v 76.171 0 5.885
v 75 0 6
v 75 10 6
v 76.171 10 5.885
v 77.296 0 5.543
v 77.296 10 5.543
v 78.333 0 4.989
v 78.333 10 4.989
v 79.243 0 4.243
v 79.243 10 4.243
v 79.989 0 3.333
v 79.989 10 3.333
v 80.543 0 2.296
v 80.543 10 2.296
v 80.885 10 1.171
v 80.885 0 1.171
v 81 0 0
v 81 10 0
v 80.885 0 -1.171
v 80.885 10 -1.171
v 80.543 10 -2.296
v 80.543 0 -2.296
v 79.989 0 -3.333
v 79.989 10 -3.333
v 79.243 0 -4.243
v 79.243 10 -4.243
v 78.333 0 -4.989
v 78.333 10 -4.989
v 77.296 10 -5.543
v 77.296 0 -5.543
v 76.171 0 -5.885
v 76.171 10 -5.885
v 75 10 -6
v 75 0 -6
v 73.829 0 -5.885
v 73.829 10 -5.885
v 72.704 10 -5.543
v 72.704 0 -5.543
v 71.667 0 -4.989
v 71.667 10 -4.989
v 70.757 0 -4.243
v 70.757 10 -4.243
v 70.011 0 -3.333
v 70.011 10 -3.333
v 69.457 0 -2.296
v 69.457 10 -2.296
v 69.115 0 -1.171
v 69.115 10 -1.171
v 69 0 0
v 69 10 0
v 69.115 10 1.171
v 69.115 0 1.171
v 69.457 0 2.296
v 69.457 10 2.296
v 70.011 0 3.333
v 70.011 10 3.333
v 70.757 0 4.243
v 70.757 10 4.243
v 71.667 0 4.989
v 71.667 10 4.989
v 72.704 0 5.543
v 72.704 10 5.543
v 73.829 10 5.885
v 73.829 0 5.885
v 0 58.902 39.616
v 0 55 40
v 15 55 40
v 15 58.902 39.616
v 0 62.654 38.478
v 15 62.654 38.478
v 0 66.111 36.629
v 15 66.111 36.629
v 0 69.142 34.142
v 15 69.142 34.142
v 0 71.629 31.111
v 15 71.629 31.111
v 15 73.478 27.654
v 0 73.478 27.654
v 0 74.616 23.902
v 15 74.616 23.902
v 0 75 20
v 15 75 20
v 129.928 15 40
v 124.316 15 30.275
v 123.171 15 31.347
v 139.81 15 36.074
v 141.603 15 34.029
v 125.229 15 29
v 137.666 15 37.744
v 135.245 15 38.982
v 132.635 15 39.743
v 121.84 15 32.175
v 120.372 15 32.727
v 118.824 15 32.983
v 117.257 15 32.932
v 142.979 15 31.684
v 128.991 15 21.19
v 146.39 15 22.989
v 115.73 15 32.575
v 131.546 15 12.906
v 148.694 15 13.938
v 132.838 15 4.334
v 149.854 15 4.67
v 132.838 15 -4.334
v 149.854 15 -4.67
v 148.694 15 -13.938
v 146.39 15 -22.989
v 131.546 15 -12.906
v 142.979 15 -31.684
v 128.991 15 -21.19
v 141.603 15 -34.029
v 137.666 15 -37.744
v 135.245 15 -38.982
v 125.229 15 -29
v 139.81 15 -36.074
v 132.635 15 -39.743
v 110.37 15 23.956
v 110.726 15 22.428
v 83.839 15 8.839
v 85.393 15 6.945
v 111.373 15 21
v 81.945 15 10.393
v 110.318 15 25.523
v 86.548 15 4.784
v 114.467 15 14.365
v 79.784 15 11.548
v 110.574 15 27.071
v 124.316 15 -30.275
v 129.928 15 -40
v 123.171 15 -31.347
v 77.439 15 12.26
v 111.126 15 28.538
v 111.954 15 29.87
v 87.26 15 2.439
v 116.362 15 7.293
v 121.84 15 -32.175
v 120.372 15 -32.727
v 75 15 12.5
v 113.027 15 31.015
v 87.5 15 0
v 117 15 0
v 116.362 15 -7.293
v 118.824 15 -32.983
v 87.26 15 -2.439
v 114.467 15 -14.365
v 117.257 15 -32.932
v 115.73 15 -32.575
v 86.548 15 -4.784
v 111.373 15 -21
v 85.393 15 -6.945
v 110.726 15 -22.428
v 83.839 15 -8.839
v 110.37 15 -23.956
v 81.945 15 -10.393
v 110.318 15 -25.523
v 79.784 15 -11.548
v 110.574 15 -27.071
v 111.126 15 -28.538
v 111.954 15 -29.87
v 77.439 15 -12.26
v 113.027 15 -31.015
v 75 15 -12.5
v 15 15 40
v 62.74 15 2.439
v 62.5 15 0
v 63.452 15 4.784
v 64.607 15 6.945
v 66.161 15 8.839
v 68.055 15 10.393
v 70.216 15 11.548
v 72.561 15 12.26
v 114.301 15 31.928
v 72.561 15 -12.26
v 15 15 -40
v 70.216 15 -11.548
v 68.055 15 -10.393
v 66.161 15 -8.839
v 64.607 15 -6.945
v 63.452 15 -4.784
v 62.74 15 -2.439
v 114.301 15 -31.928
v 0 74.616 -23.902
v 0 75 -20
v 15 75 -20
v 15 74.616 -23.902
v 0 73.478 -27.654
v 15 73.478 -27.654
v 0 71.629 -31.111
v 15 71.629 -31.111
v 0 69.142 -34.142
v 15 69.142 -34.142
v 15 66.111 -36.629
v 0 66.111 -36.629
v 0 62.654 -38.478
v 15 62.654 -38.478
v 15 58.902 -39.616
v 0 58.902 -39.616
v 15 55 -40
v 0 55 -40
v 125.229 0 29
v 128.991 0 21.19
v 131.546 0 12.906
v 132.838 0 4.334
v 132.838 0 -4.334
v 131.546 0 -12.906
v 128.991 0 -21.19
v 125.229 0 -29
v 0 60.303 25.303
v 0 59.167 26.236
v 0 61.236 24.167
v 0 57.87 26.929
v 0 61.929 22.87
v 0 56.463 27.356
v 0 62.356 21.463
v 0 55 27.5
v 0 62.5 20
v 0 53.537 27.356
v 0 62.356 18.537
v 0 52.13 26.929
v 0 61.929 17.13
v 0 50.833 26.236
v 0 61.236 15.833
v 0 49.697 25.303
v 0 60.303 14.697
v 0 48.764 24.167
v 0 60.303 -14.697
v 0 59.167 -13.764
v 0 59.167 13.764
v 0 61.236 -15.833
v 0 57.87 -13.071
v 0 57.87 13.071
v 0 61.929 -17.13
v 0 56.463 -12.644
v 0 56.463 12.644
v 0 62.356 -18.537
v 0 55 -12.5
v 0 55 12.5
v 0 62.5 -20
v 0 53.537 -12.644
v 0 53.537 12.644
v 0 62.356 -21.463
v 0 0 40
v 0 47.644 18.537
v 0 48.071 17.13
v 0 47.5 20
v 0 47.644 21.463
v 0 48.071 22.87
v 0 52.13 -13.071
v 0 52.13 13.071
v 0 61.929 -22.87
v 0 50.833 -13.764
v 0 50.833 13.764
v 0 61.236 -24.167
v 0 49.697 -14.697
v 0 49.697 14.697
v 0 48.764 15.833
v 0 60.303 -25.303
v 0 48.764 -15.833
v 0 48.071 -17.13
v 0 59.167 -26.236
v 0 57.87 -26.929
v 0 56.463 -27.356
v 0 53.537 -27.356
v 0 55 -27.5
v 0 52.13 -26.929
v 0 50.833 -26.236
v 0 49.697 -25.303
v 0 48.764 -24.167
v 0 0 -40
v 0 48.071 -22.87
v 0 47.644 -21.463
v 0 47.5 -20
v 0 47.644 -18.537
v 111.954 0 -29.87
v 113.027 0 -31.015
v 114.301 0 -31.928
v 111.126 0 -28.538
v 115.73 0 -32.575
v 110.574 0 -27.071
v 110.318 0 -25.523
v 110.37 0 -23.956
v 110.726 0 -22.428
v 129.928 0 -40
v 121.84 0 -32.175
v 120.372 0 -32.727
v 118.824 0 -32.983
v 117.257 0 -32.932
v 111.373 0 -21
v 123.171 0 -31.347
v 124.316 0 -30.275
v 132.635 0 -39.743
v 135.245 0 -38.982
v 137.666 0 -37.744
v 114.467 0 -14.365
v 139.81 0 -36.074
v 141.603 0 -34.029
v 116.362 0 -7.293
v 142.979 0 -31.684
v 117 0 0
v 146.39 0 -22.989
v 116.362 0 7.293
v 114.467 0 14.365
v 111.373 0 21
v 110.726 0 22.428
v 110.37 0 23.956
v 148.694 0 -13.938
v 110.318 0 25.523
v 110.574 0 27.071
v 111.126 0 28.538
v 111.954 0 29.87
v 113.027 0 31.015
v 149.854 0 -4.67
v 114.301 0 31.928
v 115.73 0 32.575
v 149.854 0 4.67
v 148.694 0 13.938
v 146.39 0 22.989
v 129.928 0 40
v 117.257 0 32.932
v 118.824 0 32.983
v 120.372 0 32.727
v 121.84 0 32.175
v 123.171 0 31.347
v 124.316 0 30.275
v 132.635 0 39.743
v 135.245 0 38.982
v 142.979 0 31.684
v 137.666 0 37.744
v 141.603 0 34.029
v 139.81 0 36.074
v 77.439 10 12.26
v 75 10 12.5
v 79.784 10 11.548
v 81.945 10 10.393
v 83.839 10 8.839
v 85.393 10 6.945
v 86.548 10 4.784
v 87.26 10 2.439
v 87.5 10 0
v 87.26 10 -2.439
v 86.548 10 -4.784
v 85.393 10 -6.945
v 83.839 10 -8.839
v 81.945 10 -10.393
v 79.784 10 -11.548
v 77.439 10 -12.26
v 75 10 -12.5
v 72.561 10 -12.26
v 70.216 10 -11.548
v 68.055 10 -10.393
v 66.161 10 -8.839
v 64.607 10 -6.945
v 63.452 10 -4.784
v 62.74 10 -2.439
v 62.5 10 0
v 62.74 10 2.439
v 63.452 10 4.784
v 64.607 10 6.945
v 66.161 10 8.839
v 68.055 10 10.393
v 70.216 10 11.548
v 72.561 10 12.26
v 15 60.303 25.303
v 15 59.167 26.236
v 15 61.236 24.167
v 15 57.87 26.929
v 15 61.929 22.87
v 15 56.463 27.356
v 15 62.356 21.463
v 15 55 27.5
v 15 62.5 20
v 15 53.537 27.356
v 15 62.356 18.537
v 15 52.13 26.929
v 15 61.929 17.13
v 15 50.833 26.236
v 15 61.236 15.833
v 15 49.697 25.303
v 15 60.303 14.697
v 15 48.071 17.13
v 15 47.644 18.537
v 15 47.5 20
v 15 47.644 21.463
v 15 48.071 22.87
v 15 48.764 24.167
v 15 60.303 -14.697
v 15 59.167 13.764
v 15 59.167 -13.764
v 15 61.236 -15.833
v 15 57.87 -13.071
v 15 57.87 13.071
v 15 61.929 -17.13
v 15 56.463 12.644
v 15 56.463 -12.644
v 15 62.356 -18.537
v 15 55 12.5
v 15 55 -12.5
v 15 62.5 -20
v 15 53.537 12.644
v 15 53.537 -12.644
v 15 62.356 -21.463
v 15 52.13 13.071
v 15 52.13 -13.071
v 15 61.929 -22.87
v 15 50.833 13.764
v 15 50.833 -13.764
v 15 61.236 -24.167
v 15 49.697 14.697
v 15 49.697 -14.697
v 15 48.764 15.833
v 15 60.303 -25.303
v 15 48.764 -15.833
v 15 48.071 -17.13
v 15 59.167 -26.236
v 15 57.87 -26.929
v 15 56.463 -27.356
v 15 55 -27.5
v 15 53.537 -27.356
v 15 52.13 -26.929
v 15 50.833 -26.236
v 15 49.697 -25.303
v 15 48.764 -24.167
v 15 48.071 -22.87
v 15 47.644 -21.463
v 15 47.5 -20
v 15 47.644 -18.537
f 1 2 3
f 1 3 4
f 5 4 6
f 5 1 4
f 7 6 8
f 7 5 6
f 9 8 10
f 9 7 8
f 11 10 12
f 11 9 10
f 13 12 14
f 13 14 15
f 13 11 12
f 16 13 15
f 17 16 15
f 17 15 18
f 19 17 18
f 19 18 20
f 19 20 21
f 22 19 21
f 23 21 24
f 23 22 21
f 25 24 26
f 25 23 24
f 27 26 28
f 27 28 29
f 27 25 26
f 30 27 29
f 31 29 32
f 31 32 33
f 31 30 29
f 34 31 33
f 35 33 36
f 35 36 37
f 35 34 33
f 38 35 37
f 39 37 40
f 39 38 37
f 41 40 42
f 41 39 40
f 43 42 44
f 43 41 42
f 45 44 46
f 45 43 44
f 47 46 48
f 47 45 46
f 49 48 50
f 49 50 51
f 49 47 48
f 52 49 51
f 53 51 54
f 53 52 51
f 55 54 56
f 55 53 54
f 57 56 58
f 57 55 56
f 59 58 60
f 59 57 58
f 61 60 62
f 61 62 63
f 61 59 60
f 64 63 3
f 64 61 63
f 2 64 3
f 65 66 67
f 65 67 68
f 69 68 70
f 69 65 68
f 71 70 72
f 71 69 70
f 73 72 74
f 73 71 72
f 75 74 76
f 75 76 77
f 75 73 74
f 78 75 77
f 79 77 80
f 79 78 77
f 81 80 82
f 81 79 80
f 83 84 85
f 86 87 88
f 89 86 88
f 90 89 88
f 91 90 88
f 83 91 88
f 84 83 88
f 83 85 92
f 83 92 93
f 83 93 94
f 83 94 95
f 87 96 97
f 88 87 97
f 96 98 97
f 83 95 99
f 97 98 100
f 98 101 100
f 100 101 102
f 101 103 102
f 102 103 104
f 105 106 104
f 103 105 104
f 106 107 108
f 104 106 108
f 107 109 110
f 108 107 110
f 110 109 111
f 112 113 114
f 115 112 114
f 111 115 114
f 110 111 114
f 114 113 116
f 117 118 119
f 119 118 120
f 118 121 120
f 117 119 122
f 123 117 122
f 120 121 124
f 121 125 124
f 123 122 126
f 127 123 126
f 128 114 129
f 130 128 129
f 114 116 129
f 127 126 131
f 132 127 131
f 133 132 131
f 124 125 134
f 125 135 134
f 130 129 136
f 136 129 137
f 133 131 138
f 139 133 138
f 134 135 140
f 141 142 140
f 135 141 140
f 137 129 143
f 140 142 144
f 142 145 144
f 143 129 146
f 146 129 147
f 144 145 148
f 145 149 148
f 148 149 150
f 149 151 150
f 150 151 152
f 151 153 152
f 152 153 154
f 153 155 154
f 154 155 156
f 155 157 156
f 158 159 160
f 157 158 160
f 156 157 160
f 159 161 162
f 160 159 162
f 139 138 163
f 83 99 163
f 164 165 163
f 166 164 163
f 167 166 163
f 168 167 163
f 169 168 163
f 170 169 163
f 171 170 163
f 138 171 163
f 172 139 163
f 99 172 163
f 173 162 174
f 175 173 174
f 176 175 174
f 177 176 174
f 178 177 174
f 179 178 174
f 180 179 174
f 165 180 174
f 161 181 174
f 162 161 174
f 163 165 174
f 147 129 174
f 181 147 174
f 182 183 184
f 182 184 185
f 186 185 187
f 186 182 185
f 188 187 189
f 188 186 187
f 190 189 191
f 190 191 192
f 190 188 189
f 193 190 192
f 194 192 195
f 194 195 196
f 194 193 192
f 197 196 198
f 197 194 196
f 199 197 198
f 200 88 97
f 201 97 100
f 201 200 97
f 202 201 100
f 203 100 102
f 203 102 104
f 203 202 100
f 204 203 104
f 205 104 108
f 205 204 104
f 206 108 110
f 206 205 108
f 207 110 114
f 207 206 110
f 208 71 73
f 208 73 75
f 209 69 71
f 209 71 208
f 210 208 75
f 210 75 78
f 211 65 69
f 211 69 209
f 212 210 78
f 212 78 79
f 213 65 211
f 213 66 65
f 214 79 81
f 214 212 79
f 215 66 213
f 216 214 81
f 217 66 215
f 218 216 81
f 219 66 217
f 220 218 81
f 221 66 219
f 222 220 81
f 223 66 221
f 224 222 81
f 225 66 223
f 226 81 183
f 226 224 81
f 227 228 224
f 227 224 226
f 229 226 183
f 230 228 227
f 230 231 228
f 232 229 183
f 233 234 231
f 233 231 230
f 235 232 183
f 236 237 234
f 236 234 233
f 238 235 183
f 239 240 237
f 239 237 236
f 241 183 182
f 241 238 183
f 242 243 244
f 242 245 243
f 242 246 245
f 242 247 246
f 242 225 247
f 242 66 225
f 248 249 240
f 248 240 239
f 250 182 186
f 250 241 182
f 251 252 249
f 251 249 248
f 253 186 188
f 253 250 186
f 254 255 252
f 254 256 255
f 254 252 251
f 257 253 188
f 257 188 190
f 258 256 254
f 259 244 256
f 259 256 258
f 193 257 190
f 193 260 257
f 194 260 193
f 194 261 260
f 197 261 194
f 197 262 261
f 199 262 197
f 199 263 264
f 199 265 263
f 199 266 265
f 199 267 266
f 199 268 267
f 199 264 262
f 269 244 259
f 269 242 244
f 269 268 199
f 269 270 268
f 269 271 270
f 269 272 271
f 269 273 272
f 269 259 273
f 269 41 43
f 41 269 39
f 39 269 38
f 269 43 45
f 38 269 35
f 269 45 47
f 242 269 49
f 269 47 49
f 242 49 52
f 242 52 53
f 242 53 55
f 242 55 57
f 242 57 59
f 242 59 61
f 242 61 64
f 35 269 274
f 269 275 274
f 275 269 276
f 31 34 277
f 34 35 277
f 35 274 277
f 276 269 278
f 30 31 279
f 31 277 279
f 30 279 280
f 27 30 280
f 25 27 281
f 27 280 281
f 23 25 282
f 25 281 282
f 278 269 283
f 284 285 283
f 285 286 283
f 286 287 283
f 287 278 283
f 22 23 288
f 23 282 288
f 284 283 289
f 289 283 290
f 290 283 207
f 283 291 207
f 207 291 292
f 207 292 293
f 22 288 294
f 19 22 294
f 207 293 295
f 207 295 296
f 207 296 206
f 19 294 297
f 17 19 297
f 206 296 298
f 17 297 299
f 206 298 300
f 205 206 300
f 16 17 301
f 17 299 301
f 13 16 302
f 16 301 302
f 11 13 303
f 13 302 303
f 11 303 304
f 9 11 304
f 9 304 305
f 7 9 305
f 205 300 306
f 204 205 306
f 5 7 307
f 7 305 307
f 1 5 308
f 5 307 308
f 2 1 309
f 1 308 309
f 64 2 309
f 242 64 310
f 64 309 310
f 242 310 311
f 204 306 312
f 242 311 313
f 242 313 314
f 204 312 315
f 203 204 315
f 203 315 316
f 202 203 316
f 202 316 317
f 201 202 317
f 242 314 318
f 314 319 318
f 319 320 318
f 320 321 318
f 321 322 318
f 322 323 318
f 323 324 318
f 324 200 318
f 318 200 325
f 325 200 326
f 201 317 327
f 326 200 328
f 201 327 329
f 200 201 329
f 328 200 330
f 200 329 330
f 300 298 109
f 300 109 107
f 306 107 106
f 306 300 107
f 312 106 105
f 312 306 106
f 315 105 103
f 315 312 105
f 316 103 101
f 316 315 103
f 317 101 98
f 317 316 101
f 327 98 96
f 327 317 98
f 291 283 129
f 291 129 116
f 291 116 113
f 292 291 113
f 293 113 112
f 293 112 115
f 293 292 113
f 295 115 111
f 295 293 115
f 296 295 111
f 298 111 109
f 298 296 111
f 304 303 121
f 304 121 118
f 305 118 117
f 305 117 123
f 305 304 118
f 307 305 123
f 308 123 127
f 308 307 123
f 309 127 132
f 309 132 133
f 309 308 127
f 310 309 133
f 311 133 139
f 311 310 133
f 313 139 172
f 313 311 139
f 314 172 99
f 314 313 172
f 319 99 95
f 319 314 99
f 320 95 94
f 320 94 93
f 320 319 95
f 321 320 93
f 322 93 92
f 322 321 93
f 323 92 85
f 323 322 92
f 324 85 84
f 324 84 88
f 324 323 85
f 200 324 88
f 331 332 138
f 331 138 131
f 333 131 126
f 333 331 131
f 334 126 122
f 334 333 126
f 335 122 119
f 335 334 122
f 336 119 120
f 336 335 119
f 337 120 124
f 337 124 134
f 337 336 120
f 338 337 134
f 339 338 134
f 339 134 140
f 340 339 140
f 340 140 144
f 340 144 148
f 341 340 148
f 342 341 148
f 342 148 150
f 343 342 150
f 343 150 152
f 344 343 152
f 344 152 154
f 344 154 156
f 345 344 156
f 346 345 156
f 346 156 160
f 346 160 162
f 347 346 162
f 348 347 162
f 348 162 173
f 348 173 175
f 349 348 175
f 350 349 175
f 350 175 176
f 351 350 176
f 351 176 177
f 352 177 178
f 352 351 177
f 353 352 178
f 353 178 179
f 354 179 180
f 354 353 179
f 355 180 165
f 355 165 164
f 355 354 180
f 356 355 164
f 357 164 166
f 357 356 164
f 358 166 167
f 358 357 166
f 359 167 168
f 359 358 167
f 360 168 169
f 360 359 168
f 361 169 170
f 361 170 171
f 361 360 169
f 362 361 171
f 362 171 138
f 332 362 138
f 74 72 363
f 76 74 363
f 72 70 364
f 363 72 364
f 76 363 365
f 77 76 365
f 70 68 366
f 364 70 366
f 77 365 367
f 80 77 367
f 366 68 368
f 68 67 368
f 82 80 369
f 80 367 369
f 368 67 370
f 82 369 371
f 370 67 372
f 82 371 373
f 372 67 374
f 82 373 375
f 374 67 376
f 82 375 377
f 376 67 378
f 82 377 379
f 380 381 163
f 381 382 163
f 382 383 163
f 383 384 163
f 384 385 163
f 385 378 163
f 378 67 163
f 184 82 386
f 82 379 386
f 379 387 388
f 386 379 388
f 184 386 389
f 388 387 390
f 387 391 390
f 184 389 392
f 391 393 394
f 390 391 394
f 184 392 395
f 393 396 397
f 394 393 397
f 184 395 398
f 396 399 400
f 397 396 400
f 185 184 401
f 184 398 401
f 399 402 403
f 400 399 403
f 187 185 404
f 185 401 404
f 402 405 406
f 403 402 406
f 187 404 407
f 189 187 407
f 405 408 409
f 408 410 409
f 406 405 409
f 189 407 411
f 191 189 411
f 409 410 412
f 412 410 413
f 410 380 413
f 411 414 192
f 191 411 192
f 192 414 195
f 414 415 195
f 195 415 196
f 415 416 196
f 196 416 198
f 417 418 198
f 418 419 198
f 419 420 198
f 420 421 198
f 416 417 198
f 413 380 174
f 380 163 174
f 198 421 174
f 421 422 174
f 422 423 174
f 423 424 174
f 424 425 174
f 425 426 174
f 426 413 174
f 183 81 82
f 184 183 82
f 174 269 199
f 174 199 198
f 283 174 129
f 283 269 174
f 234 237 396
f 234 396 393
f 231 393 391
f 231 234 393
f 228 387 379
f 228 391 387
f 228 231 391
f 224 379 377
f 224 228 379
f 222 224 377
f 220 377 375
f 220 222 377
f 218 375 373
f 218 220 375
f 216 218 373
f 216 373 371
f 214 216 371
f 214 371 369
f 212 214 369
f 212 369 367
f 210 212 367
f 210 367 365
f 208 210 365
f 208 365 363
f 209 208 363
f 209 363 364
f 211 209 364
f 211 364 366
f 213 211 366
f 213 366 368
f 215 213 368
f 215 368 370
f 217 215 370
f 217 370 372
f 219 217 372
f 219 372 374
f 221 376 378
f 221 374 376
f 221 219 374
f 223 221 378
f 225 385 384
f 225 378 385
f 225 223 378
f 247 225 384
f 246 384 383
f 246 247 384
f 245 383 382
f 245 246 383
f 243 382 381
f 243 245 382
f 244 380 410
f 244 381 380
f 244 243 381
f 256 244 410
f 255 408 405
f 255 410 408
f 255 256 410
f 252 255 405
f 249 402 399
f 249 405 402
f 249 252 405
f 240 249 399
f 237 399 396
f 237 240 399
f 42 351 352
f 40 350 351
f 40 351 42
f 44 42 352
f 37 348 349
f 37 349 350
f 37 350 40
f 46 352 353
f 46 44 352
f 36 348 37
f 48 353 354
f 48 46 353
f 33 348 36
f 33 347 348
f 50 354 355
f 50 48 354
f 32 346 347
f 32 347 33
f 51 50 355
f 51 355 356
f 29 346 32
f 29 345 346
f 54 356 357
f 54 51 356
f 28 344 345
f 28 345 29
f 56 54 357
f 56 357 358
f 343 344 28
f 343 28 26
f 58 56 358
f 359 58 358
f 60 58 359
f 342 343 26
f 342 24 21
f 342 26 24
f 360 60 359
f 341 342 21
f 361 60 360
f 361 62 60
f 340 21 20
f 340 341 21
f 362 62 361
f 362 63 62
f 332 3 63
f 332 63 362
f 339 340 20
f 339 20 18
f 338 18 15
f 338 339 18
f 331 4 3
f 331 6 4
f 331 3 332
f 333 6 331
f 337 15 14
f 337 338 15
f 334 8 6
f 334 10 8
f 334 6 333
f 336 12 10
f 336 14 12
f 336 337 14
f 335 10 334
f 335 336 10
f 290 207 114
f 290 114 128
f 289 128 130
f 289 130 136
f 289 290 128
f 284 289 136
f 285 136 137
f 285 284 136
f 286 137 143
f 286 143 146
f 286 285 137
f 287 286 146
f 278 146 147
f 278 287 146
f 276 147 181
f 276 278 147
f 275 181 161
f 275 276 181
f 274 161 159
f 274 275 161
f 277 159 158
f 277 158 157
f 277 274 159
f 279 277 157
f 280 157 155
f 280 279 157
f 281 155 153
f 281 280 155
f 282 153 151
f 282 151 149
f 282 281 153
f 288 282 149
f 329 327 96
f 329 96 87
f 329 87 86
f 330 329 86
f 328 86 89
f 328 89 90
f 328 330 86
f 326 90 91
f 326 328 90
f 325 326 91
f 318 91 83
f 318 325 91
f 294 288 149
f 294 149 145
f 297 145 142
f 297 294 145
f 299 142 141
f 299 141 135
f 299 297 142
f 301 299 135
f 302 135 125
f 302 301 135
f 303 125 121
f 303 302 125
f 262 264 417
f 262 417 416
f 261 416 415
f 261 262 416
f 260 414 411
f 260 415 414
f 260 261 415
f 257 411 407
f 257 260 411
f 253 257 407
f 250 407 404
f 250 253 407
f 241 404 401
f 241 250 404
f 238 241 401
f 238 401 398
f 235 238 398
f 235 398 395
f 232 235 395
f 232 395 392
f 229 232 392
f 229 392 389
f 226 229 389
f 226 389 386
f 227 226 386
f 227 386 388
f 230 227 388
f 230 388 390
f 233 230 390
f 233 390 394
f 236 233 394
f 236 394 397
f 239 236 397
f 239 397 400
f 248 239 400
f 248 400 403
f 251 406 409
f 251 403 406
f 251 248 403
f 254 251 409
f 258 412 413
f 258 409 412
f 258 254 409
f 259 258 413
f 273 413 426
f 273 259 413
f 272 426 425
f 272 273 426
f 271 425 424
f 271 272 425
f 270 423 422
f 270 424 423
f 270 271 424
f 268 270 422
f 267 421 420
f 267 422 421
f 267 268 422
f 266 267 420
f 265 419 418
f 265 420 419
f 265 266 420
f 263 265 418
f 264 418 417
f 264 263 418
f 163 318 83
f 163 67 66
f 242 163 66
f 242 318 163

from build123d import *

# Parameters (mm, degrees)
SKETCH1_W               = 15
SKETCH1_H               = 80
BOSS_EXTRUDE1_DEPTH     = 75
SKETCH1_3_R             = 12.5
BOSS_EXTRUDE2_DEPTH     = 15
SKETCH1_4_R             = 12.5
SKETCH1_4_R_2           = 6
BOSS_EXTRUDE3_DEPTH     = 10
CUT_EXTRUDE1_DEPTH      = 160.530561335
CUT_EXTRUDE1_DEPTH_BACK = 160.530561335
SKETCH2_R               = 7.5


with BuildPart() as part:
    # Sketch1 → Boss-Extrude1 (new body)
    with BuildSketch(Plane(origin=(0, 0, 0), x_dir=(1, 0, 0), z_dir=(0, 1, 0))):
        with Locations((7.5, 0)):
            Rectangle(SKETCH1_W, SKETCH1_H)
    extrude(amount=BOSS_EXTRUDE1_DEPTH)

    # Sketch1<3> → Boss-Extrude2 (add)
    with BuildSketch(Plane(origin=(0, 0, 0), x_dir=(1, 0, 0), z_dir=(0, 1, 0))):
        with BuildLine():
            Line((129.928343994, 40), (15, 40))
            Line((15, 40), (15, -40))
            Line((15, -40), (129.928343994, -40))
            ThreePointArc((129.928343994, -40), (137.665581407, -37.744432147), (142.97865308, -31.684424019))
            ThreePointArc((142.97865308, -31.684424019), (150, 0), (142.97865308, 31.684424019))
            ThreePointArc((142.97865308, 31.684424019), (137.665581407, 37.744432147), (129.928343994, 40))
        make_face()
        with Locations((75, 0)):
            Circle(SKETCH1_3_R, mode=Mode.SUBTRACT)
        with BuildLine():
            ThreePointArc((125.229473419, 29), (133, 0), (125.229473419, -29))
            ThreePointArc((125.229473419, -29), (114.301270189, -31.92820323), (111.373066959, -21))
            ThreePointArc((111.373066959, -21), (117, 0), (111.373066959, 21))
            ThreePointArc((111.373066959, 21), (114.301270189, 31.92820323), (125.229473419, 29))
        make_face(mode=Mode.SUBTRACT)
    extrude(amount=BOSS_EXTRUDE2_DEPTH)

    # Sketch1<4> → Boss-Extrude3 (add)
    with BuildSketch(Plane(origin=(0, 0, 0), x_dir=(1, 0, 0), z_dir=(0, 1, 0))):
        with Locations((75, 0)):
            Circle(SKETCH1_4_R)
        with Locations((75, 0)):
            Circle(SKETCH1_4_R_2, mode=Mode.SUBTRACT)
    extrude(amount=BOSS_EXTRUDE3_DEPTH)

    # Sketch2 → Cut-Extrude1 (cut, two sides: drawn at the far end of the back side and taken through both)
    with BuildSketch(Plane(origin=(15, 0, 0), x_dir=(0, 0, -1), z_dir=(1, 0, 0)).offset(-CUT_EXTRUDE1_DEPTH_BACK)):
        with Locations((-20, 55)):
            Circle(SKETCH2_R)
        with BuildLine():
            ThreePointArc((-40, 55), (-34.142135624, 69.142135624), (-20, 75))
            Line((-20, 75), (-40, 75))
            Line((-40, 75), (-40, 55))
        make_face()
        with BuildLine():
            ThreePointArc((20, 75), (34.142135624, 69.142135624), (40, 55))
            Line((40, 55), (40, 75))
            Line((40, 75), (20, 75))
        make_face()
        with Locations((20, 55)):
            Circle(SKETCH2_R)
    extrude(amount=CUT_EXTRUDE1_DEPTH + CUT_EXTRUDE1_DEPTH_BACK, mode=Mode.SUBTRACT)


solid = part.part
